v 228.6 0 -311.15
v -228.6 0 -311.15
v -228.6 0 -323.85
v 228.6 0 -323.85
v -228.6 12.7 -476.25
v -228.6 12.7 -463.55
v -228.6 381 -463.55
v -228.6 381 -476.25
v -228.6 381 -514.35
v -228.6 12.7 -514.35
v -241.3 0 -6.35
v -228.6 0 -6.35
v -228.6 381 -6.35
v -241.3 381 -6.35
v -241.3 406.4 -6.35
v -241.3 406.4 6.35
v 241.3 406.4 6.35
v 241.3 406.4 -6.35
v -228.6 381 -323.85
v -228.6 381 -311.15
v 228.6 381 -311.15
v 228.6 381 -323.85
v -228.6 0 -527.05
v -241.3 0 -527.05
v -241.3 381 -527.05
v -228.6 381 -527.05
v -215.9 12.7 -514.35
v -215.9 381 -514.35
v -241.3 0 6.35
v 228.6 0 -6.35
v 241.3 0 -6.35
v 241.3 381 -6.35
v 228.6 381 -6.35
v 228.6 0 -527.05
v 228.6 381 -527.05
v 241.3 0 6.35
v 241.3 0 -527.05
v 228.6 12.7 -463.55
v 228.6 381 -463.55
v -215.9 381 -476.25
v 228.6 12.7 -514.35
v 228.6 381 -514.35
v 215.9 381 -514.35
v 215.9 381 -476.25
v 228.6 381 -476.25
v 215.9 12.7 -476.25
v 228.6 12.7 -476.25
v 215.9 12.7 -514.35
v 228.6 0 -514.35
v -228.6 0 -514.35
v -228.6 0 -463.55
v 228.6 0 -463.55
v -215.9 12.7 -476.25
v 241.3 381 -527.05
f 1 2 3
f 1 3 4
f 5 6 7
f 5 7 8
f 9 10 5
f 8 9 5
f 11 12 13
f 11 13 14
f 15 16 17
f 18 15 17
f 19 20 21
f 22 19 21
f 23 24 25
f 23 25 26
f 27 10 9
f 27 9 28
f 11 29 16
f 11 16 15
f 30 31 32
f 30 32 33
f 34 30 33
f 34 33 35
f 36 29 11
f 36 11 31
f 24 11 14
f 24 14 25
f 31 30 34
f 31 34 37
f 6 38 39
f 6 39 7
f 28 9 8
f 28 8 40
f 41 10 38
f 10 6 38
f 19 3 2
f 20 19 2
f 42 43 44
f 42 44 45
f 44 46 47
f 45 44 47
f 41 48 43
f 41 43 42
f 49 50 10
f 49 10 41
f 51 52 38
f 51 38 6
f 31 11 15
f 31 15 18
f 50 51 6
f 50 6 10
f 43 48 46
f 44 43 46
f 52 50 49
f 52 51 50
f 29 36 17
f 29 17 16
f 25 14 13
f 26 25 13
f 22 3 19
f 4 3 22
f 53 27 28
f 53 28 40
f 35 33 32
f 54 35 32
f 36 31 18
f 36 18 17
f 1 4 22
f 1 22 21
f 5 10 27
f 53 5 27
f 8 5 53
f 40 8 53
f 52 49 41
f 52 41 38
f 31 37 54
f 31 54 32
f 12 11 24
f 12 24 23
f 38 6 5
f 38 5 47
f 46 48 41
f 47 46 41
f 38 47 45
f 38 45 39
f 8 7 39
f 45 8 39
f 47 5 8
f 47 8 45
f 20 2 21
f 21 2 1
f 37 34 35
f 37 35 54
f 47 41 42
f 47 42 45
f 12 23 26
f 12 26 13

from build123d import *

# Parameters (mm, degrees)
F1_DEPTH = 406.4
F2_DEPTH = 381
F3_START = -12.7
F3_DEPTH = 368.3
F4_START = -12.7
F0_W     = 12.7
F0_H     = 38.1
F4_DEPTH = 368.3
F0_W_2   = 431.8
F5_DEPTH = 12.7
F0_W_3   = 457.2
F0_H_2   = 12.7
F6_DEPTH = 381


with BuildPart() as f1:
    # F0 (on Front) → F1 (new body)
    with BuildSketch(Plane.XZ):
        Polygon((241.3, 6.35), (-241.3, 6.35), (-241.3, -6.35), (-228.6, -6.35), (228.6, -6.35), (241.3, -6.35), align=None)
    extrude(amount=-F1_DEPTH)


with BuildPart() as f2:
    # F0 (on Front) → F2 (new body)
    with BuildSketch(Plane.XZ):
        Polygon((-228.6, -6.35), (-241.3, -6.35), (-241.3, -527.05), (-228.6, -527.05), (-228.6, -514.35), (-228.6, -476.25), (-228.6, -463.55), (-228.6, -323.85), (-228.6, -311.15), align=None)
    extrude(amount=-F2_DEPTH)


with BuildPart() as f2b:
    # F0 (on Front) → F2, piece 2 (new body)
    with BuildSketch(Plane.XZ):
        Polygon((241.3, -527.05), (241.3, -6.35), (228.6, -6.35), (228.6, -311.15), (228.6, -323.85), (228.6, -463.55), (228.6, -476.25), (228.6, -514.35), (228.6, -527.05), align=None)
    extrude(amount=-F2_DEPTH)


with BuildPart() as f3:
    # F0 (on Front) → F3 (new body)
    with BuildSketch(Plane.XZ.offset(F3_START)):
        Polygon((228.6, -463.55), (-228.6, -463.55), (-228.6, -476.25), (-215.9, -476.25), (215.9, -476.25), (228.6, -476.25), align=None)
    extrude(amount=-F3_DEPTH)


with BuildPart() as f4:
    # F0 (on Front) → F4 (new body)
    with BuildSketch(Plane.XZ.offset(F4_START)):
        with Locations((-222.25, -495.3)):
            Rectangle(F0_W, F0_H)
    extrude(amount=-F4_DEPTH)


with BuildPart() as f4b:
    # F0 (on Front) → F4, piece 2 (new body)
    with BuildSketch(Plane.XZ.offset(F4_START)):
        with Locations((222.25, -495.3)):
            Rectangle(F0_W, F0_H)
    extrude(amount=-F4_DEPTH)


with BuildPart() as f5:
    # F0 (on Front) → F5 (new body)
    with BuildSketch(Plane.XZ):
        with Locations((-222.25, -495.3)):
            Rectangle(F0_W, F0_H)
        with Locations((0, -495.3)):
            Rectangle(F0_W_2, F0_H)
        Polygon((228.6, -463.55), (-228.6, -463.55), (-228.6, -476.25), (-215.9, -476.25), (215.9, -476.25), (228.6, -476.25), align=None)
        with Locations((222.25, -495.3)):
            Rectangle(F0_W, F0_H)
    extrude(amount=-F5_DEPTH)


with BuildPart() as f6:
    # F0 (on Front) → F6 (new body, through all)
    with BuildSketch(Plane.XZ):
        with Locations((0, -317.5)):
            Rectangle(F0_W_3, F0_H_2)
    extrude(amount=-F6_DEPTH)


solid = Compound([f1.part, f2.part, f2b.part, f3.part, f4.part, f4b.part, f5.part, f6.part])
